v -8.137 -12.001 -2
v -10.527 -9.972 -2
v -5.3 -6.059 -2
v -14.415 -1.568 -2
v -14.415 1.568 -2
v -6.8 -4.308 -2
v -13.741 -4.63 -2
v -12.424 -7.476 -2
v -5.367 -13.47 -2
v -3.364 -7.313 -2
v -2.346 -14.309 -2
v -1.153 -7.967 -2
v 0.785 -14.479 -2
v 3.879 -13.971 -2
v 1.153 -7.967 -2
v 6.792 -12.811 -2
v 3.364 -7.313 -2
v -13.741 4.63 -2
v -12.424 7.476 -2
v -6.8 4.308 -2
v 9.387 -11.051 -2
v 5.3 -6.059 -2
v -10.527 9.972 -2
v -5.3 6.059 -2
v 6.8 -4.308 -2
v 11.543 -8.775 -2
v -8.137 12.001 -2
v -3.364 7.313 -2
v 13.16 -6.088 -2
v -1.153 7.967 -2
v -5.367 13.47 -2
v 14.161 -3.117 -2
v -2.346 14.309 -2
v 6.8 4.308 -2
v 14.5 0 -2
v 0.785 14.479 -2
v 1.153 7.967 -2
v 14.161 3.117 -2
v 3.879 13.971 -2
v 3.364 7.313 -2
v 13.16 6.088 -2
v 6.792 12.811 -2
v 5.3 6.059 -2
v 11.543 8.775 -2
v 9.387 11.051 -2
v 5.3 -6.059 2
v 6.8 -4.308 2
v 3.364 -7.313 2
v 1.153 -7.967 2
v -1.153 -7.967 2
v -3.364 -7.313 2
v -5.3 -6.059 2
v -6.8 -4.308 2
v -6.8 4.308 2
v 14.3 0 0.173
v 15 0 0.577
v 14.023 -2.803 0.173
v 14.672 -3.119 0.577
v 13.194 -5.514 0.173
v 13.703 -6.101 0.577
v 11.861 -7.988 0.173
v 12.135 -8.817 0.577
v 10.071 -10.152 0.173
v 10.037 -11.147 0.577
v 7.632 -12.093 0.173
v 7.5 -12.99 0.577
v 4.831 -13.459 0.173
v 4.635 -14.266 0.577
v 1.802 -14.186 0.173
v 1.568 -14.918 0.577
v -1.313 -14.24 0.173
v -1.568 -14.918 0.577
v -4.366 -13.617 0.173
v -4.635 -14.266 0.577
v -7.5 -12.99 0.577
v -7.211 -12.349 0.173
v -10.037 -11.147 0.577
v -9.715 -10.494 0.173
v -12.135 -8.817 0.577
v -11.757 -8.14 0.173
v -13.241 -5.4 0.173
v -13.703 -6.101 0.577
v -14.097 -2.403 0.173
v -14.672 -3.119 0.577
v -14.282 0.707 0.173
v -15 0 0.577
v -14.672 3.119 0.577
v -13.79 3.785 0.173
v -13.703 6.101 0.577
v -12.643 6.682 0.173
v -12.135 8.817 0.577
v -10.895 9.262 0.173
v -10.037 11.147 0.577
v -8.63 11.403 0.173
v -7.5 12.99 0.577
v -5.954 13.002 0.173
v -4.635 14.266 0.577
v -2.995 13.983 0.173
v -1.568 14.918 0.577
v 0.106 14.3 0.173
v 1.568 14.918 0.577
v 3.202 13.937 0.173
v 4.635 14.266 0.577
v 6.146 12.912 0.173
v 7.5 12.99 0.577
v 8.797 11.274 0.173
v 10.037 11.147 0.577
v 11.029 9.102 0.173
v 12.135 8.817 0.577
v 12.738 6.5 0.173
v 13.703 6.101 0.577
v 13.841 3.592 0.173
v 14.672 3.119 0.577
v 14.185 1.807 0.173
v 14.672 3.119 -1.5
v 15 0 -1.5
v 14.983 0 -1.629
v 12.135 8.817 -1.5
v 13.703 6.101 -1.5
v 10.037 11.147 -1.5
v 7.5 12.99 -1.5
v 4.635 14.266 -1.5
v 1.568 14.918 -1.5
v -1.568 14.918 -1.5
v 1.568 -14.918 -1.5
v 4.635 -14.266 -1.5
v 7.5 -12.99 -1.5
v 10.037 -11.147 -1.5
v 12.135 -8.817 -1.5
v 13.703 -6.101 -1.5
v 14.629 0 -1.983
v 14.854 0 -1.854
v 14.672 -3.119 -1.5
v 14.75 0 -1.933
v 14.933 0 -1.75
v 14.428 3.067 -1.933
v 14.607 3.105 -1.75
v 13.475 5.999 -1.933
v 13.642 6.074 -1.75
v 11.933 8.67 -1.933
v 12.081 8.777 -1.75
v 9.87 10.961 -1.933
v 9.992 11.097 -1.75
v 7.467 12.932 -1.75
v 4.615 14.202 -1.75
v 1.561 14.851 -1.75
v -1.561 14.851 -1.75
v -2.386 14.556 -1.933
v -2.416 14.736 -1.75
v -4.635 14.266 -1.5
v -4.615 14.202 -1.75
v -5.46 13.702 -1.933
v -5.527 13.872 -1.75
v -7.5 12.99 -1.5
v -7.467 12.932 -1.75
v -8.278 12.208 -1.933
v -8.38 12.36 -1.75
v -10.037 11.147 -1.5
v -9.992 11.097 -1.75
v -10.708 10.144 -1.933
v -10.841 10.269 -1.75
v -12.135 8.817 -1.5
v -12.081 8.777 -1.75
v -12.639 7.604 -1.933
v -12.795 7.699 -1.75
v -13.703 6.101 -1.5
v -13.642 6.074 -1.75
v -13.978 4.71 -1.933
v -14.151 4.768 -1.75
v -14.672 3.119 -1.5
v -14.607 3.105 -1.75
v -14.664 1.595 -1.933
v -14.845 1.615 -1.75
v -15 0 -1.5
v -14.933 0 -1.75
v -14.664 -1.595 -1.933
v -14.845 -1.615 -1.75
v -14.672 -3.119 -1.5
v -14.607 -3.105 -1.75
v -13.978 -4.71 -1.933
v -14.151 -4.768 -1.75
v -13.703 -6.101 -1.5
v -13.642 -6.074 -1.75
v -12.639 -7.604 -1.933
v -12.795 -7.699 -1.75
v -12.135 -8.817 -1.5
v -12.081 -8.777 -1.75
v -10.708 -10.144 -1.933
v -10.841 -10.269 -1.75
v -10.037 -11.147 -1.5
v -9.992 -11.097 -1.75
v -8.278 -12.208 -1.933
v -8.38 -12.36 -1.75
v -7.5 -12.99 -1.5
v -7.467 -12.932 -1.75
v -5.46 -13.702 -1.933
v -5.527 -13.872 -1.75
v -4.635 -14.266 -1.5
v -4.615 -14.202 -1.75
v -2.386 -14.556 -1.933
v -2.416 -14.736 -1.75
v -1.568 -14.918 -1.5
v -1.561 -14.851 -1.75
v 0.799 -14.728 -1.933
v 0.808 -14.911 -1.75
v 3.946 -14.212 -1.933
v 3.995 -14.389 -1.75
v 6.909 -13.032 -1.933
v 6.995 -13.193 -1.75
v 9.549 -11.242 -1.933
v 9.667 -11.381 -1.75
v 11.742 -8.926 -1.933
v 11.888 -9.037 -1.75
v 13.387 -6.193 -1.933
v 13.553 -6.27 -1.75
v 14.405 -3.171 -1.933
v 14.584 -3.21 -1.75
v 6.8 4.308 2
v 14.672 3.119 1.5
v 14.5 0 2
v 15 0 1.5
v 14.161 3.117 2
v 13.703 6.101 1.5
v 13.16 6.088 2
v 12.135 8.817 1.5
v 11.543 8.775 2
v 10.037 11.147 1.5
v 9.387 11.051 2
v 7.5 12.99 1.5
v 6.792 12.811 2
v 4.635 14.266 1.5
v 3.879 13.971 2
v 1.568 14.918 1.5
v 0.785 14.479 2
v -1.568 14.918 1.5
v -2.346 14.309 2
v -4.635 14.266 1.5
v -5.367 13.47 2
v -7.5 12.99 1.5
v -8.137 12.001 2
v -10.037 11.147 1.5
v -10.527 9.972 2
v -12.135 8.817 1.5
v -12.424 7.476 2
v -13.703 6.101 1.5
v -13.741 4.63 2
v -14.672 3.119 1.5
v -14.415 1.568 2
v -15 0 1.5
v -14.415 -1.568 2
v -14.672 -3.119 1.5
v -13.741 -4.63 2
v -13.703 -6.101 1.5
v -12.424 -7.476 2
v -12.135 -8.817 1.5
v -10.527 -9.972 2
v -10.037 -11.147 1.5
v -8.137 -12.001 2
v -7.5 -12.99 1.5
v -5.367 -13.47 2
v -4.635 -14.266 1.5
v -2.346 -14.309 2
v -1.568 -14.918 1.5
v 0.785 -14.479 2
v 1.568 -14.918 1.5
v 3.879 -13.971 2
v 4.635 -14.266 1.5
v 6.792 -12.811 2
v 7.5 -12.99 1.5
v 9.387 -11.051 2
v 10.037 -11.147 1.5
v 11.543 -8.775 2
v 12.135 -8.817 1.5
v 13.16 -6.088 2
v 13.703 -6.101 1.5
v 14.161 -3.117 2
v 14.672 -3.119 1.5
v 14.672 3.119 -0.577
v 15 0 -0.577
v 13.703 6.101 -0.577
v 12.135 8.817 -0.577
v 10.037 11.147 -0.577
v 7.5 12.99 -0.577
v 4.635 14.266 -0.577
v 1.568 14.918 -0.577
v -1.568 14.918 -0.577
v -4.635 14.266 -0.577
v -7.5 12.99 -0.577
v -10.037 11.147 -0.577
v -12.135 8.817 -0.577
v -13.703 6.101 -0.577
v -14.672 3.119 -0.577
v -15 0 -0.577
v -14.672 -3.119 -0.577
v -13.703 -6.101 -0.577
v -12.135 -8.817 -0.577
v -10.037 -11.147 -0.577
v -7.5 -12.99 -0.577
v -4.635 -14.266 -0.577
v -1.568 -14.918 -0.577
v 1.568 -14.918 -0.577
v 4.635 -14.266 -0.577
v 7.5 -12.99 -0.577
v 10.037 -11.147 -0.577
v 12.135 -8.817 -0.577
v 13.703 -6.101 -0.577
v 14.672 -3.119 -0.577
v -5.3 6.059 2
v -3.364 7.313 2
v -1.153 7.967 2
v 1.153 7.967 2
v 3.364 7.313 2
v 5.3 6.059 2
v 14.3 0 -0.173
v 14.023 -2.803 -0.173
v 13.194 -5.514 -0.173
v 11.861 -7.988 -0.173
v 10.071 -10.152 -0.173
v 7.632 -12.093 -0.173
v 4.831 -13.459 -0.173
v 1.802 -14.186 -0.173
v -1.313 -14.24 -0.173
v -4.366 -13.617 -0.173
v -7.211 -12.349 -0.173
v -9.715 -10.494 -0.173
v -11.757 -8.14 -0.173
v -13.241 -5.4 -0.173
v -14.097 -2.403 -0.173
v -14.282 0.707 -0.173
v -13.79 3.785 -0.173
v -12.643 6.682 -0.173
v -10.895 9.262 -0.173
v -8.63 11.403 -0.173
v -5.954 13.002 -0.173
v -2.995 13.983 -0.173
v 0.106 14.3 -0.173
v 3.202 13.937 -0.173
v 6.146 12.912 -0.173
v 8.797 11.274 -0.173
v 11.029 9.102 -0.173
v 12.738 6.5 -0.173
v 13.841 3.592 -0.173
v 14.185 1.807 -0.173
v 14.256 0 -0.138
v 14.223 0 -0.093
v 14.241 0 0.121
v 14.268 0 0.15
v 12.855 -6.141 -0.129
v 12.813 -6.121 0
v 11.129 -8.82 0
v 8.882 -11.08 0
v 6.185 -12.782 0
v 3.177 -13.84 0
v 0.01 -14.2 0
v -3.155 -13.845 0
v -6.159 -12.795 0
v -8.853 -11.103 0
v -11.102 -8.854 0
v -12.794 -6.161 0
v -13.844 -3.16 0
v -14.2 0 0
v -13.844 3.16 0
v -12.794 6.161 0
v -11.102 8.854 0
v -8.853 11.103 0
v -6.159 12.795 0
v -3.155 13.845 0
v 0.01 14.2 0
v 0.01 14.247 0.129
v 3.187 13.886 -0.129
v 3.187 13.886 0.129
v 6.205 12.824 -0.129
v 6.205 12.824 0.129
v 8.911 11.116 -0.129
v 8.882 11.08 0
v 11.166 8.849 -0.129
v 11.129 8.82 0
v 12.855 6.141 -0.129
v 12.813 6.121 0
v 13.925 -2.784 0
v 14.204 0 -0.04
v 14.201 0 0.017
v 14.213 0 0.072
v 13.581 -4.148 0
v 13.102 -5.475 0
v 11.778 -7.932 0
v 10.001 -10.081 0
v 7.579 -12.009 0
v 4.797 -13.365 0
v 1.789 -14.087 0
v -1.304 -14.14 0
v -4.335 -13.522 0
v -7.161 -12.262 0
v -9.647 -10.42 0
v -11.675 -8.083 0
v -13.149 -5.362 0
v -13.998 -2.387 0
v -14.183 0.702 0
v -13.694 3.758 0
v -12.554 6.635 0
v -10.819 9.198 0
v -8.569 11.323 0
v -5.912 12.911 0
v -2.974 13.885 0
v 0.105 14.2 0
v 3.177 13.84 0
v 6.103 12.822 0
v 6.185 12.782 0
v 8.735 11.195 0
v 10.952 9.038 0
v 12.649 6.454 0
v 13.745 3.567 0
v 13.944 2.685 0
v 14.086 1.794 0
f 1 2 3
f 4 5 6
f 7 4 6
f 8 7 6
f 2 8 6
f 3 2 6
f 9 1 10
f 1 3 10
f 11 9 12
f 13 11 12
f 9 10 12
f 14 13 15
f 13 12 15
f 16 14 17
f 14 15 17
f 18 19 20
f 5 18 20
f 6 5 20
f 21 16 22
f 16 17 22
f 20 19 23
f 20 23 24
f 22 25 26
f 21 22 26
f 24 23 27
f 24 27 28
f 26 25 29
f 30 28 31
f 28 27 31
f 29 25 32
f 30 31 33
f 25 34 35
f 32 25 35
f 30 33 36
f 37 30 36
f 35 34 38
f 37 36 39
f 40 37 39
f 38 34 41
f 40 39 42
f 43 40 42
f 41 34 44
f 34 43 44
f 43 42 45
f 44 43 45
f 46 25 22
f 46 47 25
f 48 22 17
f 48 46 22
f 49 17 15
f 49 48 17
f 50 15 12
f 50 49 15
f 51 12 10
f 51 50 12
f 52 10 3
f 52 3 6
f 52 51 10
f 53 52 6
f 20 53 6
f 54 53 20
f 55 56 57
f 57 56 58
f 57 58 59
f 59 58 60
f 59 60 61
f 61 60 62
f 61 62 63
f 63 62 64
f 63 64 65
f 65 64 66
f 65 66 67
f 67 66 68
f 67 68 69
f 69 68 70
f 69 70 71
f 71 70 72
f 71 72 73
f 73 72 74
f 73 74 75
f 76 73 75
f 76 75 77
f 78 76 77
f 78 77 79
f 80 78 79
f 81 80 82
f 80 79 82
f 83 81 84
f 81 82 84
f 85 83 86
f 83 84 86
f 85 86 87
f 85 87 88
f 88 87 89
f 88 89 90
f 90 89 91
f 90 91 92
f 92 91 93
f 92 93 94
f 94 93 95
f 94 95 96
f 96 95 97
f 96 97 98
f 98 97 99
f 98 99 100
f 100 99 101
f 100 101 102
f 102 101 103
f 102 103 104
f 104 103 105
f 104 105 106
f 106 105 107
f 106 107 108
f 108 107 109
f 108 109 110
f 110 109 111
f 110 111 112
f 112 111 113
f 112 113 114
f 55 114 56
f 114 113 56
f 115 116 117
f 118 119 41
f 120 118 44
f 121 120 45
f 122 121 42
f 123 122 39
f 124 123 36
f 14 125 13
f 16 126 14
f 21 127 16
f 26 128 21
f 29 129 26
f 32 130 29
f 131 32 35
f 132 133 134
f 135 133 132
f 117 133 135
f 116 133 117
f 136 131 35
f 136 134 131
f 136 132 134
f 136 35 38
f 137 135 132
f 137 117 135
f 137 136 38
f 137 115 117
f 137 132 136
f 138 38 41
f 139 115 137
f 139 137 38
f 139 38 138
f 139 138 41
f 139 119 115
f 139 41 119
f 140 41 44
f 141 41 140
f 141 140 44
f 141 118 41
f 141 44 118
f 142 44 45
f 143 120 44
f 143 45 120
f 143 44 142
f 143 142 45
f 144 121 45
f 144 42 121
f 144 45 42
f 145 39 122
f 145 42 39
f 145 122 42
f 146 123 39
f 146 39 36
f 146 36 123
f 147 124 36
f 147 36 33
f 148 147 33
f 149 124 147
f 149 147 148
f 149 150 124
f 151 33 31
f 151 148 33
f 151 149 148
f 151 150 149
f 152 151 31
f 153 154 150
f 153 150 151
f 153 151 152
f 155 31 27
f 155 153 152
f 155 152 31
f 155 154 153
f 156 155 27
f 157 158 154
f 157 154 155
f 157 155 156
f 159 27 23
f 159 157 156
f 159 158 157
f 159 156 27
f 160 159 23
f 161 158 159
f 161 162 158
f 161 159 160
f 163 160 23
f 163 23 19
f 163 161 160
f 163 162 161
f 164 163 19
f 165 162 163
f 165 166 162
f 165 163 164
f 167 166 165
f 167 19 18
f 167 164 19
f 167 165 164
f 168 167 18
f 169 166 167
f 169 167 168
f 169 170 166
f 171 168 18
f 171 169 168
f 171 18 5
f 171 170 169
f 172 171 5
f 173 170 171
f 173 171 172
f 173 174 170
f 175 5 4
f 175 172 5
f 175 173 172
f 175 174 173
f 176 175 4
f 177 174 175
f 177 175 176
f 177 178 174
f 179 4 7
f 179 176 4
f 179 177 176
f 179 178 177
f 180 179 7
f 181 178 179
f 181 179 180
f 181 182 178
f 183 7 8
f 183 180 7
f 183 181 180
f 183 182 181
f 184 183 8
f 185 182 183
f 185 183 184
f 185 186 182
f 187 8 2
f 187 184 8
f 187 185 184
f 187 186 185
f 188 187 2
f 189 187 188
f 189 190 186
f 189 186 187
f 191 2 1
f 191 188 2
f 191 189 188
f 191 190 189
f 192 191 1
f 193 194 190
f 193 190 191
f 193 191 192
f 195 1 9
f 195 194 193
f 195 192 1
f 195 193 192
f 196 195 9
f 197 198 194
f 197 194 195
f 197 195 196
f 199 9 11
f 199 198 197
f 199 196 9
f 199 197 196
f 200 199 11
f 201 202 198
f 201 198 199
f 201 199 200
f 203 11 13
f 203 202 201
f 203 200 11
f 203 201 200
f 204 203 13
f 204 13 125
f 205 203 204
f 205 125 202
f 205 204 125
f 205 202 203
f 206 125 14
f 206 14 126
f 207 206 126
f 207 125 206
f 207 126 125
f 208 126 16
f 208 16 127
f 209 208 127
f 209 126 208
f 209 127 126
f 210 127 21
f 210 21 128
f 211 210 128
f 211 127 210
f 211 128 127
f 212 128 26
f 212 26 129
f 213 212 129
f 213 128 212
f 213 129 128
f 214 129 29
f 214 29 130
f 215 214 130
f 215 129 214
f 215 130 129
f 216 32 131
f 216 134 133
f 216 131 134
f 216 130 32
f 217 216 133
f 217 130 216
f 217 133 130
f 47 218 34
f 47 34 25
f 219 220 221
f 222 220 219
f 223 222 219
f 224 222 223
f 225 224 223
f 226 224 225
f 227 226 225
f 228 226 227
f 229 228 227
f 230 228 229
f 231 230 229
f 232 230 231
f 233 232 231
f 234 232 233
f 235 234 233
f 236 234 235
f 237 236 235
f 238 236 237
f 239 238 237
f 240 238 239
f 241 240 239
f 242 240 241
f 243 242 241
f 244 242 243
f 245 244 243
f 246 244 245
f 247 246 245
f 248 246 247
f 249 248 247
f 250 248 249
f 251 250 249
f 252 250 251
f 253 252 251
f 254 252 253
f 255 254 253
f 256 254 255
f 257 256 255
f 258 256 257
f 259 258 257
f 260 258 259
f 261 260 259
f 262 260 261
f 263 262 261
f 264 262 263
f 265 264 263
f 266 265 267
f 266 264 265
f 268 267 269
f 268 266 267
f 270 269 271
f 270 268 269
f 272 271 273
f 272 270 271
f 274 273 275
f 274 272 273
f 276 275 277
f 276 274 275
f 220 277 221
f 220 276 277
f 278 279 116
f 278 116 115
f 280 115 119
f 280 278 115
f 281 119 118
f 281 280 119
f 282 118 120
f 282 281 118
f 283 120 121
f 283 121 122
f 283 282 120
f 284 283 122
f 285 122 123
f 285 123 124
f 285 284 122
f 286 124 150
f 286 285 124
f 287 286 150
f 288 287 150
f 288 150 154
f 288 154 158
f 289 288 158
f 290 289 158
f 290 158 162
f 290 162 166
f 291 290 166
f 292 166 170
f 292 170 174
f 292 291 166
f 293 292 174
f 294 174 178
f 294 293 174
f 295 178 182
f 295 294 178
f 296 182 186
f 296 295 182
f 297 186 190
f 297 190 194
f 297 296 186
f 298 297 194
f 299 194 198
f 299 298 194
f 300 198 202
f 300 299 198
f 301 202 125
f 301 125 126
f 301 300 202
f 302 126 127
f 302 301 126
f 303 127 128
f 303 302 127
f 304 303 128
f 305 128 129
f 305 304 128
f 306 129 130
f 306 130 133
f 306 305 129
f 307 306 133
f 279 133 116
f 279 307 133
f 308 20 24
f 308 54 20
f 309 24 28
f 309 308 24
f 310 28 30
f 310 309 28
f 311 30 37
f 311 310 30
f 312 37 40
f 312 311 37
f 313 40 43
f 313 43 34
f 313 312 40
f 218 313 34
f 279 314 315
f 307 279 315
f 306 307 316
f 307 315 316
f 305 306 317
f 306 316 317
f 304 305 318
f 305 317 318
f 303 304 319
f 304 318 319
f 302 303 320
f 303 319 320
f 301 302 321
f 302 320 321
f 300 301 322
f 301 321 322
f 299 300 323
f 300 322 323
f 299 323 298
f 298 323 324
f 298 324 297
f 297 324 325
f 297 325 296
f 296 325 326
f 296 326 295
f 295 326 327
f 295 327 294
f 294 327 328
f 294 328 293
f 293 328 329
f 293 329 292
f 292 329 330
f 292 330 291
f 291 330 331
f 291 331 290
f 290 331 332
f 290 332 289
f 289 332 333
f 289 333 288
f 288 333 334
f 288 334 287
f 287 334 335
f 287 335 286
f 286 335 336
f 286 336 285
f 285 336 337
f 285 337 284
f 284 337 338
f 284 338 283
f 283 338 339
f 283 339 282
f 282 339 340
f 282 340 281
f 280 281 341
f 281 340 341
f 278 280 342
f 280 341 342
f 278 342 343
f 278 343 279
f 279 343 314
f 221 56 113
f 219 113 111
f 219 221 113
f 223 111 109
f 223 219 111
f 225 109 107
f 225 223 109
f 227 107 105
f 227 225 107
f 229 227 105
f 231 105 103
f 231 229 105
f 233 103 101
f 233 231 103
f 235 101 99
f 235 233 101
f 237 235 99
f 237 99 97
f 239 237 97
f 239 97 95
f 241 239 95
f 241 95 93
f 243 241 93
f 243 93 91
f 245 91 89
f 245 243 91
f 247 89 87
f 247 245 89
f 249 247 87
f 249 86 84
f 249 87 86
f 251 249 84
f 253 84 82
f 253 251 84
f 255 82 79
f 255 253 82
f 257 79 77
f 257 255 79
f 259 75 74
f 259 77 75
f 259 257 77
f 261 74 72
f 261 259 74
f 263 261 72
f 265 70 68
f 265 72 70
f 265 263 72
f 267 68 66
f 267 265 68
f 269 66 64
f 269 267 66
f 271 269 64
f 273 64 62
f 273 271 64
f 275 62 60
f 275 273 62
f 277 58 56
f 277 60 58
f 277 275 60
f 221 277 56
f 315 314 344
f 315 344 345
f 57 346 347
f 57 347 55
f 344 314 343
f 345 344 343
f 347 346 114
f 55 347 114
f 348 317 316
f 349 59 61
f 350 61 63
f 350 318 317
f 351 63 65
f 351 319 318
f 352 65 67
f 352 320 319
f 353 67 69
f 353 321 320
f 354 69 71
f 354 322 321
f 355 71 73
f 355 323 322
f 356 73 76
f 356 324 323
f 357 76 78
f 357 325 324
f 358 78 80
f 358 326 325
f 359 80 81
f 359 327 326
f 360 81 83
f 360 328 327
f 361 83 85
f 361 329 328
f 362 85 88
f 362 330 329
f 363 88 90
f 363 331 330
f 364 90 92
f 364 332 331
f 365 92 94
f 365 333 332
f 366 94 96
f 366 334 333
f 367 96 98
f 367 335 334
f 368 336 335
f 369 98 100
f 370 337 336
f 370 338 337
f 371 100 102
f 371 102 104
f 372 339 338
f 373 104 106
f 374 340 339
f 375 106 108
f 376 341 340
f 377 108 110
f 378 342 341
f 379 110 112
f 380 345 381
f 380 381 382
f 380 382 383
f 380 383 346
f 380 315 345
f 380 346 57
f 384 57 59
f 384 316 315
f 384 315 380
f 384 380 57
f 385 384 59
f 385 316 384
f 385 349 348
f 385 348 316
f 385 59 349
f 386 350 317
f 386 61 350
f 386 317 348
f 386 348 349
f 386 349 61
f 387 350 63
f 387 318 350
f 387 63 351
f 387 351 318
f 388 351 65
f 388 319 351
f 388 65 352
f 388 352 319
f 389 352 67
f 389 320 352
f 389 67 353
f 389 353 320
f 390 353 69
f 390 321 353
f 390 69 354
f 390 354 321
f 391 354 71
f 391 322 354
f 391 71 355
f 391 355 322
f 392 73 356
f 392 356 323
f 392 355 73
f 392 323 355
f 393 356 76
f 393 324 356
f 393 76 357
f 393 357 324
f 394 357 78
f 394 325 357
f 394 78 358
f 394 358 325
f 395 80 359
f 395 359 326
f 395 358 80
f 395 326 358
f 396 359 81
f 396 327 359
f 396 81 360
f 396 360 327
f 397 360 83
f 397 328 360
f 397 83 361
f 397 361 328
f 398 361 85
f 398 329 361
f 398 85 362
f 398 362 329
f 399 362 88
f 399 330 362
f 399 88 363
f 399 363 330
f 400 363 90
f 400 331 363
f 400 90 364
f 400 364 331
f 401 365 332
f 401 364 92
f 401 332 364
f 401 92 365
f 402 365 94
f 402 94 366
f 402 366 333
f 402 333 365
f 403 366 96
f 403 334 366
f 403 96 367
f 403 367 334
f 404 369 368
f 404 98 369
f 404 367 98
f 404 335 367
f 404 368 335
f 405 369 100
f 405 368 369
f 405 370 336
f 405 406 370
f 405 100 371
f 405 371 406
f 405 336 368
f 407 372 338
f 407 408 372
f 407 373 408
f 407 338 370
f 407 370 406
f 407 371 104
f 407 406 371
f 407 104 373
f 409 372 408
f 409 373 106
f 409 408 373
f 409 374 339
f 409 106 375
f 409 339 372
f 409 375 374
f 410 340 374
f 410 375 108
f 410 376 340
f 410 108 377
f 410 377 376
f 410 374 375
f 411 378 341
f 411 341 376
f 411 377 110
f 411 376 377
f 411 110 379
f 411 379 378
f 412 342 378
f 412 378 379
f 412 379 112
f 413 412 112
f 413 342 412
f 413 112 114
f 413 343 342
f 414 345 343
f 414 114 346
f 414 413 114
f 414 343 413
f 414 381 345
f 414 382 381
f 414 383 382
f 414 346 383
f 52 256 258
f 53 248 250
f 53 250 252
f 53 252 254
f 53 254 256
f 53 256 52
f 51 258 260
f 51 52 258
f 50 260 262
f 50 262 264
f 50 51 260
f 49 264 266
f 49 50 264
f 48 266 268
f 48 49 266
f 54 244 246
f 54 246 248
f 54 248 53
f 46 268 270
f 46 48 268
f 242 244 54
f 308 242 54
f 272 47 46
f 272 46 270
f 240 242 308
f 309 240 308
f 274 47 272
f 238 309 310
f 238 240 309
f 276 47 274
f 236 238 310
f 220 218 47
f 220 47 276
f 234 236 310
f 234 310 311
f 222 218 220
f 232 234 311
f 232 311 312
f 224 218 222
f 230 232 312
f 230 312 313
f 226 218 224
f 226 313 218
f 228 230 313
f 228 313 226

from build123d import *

# Parameters (mm, degrees)
SKETCH_1_R      = 15
EXTRUDE_2_DEPTH = 2
FILLET_1_R      = 0.2
CHAMFER_1_SIZE  = 0.5
FILLET_2_R      = 0.5


with BuildPart() as part:
    # Эскиз1 → Бобышка-Вытянуть2 (new, symmetric)
    with BuildSketch(Plane.XY):
        Circle(SKETCH_1_R)
        with BuildLine():
            Line((6.8, 4.308421985), (6.8, -4.308421985))
            ThreePointArc((6.8, -4.308421985), (0, -8.05), (-6.8, -4.308421985))
            Line((-6.8, -4.308421985), (-6.8, 4.308421985))
            ThreePointArc((-6.8, 4.308421985), (0, 8.05), (6.8, 4.308421985))
        make_face(mode=Mode.SUBTRACT)
    extrude(amount=EXTRUDE_2_DEPTH, both=True)

    # Эскиз2 → Вырез-Повернуть1 (revolve, cut)
    with BuildSketch(Plane(origin=(0, 0, 0), x_dir=(0, 0, -1), z_dir=(1, 0, 0)), mode=Mode.PRIVATE) as cut_revolve_1_sk:
        Polygon((-0.577350269, 15), (0.577350269, 15), (0, 14), align=None)
    revolve(cut_revolve_1_sk.sketch.rotate(Axis((0, 0, 3.24866267), (0, 0, -1)), 90), axis=Axis((0, 0, 3.24866267), (0, 0, -1)), mode=Mode.SUBTRACT)

    # Скругление1
    fillet_1_edges = [part.edges().sort_by_distance(p)[0] for p in [
        (-14, 0, 0),
    ]]
    fillet(fillet_1_edges, radius=FILLET_1_R)

    # Фаска1
    chamfer_1_edges = [part.edges().sort_by_distance(p)[0] for p in [
        (-15, 0, 2),
    ]]
    chamfer(chamfer_1_edges, length=CHAMFER_1_SIZE)

    # Скругление2
    fillet_2_edges = [part.edges().sort_by_distance(p)[0] for p in [
        (-15, 0, -2),
    ]]
    fillet(fillet_2_edges, radius=FILLET_2_R)


solid = part.part
